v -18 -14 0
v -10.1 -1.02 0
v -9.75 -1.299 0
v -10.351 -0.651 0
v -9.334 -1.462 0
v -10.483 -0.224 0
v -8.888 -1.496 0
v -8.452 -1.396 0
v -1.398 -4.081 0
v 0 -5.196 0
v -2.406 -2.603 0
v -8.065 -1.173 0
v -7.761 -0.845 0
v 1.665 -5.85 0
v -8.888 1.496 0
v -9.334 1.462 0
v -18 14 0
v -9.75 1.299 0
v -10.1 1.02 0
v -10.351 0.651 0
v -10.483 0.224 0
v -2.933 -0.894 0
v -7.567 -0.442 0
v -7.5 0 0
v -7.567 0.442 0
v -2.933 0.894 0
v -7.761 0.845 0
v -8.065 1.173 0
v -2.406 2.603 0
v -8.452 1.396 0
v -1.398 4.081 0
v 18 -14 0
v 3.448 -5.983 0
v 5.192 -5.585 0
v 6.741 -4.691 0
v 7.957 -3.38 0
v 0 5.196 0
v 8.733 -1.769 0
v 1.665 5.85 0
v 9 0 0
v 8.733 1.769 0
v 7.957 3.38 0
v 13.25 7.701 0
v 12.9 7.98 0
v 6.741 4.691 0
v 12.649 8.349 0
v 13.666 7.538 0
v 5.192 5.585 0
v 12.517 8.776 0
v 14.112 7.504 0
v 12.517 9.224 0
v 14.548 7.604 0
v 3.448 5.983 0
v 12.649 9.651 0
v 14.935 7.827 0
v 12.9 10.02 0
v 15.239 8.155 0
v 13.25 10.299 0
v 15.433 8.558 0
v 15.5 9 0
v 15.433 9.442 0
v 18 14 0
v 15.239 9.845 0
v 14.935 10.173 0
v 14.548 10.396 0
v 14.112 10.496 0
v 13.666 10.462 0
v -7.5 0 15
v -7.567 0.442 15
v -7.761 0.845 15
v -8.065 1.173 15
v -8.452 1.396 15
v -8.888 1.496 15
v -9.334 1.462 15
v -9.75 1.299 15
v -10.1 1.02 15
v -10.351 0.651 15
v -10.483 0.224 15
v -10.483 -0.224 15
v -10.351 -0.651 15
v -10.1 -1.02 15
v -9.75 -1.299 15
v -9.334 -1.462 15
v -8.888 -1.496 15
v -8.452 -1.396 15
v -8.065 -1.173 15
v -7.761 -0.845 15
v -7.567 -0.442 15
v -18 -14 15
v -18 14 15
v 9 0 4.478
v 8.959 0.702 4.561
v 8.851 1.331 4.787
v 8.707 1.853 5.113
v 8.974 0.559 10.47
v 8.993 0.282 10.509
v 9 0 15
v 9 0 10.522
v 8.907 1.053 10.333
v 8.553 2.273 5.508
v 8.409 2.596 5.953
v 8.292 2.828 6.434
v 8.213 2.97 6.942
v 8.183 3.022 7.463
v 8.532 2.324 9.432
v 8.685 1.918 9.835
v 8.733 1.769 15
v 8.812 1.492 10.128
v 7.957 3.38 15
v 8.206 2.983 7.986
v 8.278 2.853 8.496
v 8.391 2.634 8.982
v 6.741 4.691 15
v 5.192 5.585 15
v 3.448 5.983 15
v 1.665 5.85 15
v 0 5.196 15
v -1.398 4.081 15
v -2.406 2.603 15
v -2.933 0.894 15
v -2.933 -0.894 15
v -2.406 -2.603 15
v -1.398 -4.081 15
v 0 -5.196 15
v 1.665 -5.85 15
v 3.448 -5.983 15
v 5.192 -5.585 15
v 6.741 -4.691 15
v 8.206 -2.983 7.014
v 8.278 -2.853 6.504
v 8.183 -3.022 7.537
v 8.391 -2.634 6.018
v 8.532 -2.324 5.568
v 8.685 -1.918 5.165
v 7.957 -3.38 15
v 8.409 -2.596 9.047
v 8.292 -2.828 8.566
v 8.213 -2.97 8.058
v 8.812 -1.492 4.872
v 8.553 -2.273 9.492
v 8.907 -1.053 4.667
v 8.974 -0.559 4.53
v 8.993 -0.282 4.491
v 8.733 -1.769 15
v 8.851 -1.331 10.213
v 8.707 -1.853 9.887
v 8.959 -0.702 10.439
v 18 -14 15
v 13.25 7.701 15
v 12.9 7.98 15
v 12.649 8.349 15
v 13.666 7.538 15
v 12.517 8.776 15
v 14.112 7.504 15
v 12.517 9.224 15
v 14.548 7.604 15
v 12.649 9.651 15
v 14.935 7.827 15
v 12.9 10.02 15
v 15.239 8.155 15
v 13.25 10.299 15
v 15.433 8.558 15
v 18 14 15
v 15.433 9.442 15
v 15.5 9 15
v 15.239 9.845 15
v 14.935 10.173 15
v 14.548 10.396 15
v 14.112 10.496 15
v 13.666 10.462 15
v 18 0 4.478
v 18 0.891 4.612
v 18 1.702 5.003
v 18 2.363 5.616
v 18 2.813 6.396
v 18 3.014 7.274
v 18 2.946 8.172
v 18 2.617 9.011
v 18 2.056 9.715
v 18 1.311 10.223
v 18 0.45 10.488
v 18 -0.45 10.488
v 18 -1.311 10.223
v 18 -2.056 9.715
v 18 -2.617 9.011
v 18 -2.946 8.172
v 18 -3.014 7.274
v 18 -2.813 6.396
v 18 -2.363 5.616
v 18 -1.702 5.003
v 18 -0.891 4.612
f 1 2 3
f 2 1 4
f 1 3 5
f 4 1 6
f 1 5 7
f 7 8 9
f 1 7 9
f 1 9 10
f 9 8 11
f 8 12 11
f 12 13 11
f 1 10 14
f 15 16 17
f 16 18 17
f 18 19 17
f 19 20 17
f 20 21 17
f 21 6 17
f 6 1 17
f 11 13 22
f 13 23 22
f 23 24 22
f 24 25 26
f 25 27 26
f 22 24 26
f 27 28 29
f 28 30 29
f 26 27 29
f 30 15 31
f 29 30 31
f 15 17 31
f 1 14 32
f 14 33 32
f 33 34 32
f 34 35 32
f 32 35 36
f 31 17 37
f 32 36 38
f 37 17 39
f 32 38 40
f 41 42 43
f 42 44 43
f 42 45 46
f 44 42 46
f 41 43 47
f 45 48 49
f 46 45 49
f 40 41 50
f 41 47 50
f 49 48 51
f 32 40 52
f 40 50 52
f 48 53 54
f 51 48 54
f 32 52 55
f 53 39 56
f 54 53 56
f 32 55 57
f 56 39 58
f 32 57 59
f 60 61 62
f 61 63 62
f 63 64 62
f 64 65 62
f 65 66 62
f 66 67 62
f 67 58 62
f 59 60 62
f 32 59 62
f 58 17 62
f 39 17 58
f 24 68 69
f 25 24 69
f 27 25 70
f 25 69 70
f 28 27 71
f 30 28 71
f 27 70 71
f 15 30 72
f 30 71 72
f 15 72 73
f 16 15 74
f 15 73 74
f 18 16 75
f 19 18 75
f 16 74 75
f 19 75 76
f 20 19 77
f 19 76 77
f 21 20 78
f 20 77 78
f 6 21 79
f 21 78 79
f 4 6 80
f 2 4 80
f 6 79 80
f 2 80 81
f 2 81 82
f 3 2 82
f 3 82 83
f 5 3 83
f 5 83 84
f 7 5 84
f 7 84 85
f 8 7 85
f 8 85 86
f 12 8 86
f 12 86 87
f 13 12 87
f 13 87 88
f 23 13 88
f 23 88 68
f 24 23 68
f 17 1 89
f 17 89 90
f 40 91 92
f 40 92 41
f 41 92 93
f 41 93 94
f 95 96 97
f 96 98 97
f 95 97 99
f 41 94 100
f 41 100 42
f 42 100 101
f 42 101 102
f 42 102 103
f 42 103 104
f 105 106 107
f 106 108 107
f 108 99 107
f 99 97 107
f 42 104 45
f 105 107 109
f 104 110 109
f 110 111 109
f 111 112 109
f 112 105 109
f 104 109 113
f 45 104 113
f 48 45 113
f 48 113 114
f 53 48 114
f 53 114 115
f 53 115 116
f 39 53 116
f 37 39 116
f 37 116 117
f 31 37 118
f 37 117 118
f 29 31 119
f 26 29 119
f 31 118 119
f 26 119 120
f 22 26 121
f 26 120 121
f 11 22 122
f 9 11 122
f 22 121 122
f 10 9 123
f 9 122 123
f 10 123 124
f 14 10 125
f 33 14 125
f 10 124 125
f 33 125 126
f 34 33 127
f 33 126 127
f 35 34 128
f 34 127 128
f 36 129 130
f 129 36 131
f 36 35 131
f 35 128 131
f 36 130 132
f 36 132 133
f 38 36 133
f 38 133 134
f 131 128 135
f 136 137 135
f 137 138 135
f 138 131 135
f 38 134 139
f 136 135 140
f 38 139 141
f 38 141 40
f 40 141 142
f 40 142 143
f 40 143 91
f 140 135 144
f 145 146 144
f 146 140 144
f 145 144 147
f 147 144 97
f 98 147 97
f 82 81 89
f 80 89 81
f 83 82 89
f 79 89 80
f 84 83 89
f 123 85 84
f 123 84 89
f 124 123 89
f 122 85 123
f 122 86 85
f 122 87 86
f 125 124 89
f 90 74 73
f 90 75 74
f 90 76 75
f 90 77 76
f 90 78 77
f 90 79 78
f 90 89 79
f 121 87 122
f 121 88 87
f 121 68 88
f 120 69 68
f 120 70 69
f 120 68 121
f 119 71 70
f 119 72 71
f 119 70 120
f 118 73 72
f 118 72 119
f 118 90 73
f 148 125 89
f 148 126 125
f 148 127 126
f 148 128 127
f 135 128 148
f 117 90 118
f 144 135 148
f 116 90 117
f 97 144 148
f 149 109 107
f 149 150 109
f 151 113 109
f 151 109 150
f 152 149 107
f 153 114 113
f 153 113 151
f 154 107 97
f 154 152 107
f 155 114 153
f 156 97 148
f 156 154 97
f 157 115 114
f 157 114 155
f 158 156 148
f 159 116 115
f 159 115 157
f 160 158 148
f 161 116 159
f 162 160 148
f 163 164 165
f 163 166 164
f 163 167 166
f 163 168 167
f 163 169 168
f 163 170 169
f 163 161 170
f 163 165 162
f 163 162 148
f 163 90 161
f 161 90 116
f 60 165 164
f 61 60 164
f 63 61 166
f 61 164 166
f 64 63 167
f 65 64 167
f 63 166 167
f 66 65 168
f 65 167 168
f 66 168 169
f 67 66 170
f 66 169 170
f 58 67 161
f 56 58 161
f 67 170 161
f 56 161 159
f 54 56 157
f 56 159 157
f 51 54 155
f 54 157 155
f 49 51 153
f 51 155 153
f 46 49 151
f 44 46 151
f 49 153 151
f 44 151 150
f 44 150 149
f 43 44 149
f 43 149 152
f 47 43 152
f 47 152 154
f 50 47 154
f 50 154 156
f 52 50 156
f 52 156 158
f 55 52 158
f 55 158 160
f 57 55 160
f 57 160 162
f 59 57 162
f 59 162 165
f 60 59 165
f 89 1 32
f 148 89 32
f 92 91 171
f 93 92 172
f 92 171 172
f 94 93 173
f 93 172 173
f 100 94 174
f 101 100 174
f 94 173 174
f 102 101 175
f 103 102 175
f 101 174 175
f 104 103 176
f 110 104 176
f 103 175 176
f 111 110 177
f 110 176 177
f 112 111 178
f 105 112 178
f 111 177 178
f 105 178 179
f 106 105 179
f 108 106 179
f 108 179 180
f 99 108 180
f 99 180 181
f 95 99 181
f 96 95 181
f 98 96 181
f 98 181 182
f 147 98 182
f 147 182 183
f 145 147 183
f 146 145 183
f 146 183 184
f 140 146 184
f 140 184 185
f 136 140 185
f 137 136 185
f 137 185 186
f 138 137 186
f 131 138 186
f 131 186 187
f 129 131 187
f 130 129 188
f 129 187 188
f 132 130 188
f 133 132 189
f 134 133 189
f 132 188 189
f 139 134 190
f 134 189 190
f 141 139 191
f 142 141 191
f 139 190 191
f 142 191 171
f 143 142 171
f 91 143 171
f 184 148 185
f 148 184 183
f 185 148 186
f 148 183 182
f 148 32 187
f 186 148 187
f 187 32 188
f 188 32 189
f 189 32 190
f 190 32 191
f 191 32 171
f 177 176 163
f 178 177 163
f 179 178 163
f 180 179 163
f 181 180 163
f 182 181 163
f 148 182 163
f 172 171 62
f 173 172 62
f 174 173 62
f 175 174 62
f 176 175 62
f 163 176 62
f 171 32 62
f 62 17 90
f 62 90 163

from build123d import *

# Parameters (mm, degrees)
IZIM1_W                     = 36
IZIM1_H                     = 28
Y_KSEKLIK_EKSTR_ZYON1_DEPTH = 15
IZIM3_R                     = 6
IZIM3_R_2                   = 1.5
KES_EKSTR_ZYON1_DEPTH       = 16
KES_EKSTR_ZYON2_REACH       = 38
IZIM4_R                     = 3.022097143


with BuildPart() as part:
    # Çizim1 → Yükseklik-Ekstrüzyon1 (new body)
    with BuildSketch(Plane.XY):
        Rectangle(IZIM1_W, IZIM1_H)
    extrude(amount=Y_KSEKLIK_EKSTR_ZYON1_DEPTH)

    # Çizim3 → Kes-Ekstrüzyon1 (cut, through all)
    with BuildSketch(Plane.XY.offset(15)):
        with Locations((3, 0)):
            Circle(IZIM3_R)
        with Locations((-9, 0)):
            Circle(IZIM3_R_2)
        with Locations((14, 9)):
            Circle(IZIM3_R_2)
    extrude(amount=-KES_EKSTR_ZYON1_DEPTH, mode=Mode.SUBTRACT)

    # Çizim4 → Kes-Ekstrüzyon2 (cut, up to next)
    with BuildSketch(Plane(origin=(18, 0, 0), x_dir=(0, 0, -1), z_dir=(1, 0, 0)), mode=Mode.PRIVATE) as kes_ekstr_zyon2_sk1:
        with Locations((-7.5, 0)):
            Circle(IZIM4_R)
    kes_ekstr_zyon2_tool1 = extrude(kes_ekstr_zyon2_sk1.sketch, amount=-KES_EKSTR_ZYON2_REACH, mode=Mode.PRIVATE) & part.part
    add(kes_ekstr_zyon2_tool1.solids().sort_by_distance((18, 0, 7.5))[0], mode=Mode.SUBTRACT)


solid = part.part
